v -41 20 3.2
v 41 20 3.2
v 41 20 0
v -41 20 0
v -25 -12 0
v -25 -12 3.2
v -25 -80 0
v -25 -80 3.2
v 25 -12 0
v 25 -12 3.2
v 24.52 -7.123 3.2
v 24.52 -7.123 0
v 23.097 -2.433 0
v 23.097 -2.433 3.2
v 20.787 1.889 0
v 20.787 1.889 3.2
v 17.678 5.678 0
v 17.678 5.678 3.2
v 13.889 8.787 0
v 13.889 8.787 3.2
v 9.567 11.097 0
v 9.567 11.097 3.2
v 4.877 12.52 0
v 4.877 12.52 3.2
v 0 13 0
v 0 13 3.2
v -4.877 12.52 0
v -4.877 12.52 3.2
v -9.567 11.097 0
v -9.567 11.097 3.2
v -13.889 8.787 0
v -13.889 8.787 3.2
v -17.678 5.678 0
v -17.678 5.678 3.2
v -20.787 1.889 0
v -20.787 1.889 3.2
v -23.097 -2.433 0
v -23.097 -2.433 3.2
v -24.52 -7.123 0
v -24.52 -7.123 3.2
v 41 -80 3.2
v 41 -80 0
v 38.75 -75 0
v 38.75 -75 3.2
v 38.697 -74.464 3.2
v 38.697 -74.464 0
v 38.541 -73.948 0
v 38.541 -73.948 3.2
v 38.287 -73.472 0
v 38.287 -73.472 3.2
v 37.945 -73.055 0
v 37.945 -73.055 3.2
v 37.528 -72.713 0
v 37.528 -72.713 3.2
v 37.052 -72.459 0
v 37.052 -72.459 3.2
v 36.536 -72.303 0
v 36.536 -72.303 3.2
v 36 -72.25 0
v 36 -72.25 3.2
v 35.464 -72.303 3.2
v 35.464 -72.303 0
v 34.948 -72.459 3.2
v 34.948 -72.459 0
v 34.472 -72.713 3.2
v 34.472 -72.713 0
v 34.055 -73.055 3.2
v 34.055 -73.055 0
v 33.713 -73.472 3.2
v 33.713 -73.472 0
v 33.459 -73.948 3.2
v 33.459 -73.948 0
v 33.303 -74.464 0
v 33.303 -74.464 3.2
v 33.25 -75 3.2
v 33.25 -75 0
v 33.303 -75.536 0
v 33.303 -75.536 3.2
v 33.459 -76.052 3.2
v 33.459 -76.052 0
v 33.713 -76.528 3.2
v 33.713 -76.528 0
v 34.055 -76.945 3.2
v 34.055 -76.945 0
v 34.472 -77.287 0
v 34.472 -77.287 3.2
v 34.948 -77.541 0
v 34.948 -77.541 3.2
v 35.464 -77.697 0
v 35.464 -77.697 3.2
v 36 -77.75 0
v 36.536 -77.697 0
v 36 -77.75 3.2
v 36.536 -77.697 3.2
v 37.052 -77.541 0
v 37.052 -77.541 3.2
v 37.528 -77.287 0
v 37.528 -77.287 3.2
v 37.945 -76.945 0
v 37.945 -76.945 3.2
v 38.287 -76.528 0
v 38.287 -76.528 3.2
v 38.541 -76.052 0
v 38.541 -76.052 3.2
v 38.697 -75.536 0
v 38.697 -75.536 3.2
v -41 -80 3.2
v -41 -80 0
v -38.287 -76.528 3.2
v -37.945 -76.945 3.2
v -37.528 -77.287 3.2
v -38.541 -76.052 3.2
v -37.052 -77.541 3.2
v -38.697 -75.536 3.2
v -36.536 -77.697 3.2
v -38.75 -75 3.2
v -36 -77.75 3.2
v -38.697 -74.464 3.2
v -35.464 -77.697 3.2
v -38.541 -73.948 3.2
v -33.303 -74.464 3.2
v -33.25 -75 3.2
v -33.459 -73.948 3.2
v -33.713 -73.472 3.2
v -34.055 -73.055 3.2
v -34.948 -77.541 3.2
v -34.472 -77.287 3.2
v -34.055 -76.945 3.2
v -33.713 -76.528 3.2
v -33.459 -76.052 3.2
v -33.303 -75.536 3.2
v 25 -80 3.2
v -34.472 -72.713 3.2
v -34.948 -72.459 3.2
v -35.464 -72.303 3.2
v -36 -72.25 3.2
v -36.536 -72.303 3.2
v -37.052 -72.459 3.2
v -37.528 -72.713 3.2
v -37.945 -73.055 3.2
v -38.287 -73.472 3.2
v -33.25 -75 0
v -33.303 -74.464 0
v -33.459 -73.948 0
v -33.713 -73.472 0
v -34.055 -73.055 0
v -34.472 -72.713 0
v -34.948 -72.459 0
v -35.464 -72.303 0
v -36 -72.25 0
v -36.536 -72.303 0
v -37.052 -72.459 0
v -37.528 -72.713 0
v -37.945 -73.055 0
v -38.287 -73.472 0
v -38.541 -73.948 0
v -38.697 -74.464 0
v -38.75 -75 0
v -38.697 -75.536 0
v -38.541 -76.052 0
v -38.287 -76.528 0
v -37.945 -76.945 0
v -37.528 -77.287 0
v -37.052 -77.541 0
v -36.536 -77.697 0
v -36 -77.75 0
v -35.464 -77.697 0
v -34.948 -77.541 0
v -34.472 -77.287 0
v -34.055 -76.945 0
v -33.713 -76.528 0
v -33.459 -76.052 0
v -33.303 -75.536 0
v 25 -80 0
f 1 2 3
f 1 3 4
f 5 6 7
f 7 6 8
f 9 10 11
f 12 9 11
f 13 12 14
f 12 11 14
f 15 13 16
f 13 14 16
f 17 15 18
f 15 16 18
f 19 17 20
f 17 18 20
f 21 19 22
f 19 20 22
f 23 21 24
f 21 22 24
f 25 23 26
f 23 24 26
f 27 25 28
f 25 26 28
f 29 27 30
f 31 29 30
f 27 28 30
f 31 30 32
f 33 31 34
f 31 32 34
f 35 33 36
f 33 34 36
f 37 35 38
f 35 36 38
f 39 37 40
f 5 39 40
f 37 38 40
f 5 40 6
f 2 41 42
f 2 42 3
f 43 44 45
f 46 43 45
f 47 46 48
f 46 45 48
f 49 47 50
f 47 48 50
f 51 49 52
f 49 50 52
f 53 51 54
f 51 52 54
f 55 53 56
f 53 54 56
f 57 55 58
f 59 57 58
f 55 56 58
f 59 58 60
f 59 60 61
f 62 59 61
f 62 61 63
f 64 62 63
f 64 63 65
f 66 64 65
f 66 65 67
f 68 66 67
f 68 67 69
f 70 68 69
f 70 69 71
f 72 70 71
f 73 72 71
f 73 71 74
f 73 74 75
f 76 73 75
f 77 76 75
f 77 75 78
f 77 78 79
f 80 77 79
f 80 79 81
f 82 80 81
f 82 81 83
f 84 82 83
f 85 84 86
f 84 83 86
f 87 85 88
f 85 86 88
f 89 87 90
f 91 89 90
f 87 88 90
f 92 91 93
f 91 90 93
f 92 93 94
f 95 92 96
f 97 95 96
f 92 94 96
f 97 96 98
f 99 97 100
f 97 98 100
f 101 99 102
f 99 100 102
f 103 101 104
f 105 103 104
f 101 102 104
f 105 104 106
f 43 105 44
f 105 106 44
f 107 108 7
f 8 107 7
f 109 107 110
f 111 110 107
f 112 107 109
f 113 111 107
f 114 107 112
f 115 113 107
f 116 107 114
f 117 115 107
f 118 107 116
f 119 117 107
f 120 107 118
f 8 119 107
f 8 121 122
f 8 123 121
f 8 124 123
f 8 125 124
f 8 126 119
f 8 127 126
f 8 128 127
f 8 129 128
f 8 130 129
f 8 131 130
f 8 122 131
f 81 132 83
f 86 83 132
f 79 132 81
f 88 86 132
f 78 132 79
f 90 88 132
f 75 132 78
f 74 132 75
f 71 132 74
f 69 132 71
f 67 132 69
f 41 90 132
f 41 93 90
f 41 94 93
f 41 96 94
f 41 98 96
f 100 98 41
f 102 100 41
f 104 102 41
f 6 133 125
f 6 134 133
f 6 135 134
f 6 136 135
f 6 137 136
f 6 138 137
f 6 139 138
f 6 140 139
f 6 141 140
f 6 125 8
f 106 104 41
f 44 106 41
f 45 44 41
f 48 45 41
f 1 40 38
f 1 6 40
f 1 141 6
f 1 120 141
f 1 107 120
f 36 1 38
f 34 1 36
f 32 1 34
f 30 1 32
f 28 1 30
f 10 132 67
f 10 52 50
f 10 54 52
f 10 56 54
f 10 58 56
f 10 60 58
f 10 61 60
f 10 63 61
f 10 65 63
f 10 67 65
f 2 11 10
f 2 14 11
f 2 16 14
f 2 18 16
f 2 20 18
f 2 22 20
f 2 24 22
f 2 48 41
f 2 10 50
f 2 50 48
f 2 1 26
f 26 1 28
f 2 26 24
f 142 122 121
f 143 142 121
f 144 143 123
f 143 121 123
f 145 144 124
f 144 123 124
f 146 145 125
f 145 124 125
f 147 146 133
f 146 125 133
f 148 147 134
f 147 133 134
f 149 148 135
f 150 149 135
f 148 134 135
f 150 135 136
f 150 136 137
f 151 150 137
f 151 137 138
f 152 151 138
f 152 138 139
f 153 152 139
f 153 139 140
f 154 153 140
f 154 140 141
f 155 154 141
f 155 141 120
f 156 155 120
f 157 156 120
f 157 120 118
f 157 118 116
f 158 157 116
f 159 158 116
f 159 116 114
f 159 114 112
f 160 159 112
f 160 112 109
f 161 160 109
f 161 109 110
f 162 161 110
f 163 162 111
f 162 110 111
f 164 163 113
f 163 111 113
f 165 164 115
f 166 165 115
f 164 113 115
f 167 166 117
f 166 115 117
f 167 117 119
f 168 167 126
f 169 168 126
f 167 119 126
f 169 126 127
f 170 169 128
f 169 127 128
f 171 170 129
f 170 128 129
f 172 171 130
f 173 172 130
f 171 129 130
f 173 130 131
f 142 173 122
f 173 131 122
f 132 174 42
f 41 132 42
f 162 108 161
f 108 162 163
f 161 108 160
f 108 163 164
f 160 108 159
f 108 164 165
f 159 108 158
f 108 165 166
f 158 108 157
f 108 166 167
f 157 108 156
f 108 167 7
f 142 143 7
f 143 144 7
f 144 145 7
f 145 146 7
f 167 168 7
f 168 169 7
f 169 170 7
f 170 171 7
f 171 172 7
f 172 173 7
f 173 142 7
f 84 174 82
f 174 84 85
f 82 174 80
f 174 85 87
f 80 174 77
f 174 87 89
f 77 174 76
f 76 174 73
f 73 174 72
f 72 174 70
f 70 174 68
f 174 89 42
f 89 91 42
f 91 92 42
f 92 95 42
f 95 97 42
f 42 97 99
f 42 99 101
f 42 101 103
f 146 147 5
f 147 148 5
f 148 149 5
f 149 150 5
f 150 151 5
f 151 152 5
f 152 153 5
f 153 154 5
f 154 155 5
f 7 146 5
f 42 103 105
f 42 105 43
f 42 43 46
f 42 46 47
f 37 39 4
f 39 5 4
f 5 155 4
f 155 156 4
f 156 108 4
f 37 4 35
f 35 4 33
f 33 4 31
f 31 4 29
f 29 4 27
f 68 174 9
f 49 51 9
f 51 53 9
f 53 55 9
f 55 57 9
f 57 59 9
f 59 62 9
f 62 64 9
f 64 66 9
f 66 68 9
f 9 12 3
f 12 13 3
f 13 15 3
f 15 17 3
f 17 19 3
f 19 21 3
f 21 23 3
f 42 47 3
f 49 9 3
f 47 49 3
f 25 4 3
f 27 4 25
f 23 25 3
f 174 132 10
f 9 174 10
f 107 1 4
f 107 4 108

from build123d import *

# Parameters (mm, degrees)
SKETCH1_W           = 150
SKETCH1_H           = 160
BOSS_EXTRUDE1_DEPTH = 3.2
CUT_EXTRUDE1_REACH  = 5.2
CUT_EXTRUDE2_REACH  = 5.2
SKETCH3_R           = 2.75


with BuildPart() as part:
    # Sketch1 → Boss-Extrude1 (new body)
    with BuildSketch(Plane.XY):
        Rectangle(SKETCH1_W, SKETCH1_H)
    extrude(amount=BOSS_EXTRUDE1_DEPTH)

    # Sketch2 → Cut-Extrude1 (cut, up to next)
    with BuildSketch(Plane.XY.offset(3.2), mode=Mode.PRIVATE) as cut_extrude1_sk1:
        with BuildLine():
            Line((-25, -12), (-25, -80))
            Line((-25, -80), (25, -80))
            Line((25, -80), (25, -12))
            ThreePointArc((25, -12), (0, 13), (-25, -12))
        make_face()
    cut_extrude1_tool1 = extrude(cut_extrude1_sk1.sketch, amount=-CUT_EXTRUDE1_REACH, mode=Mode.PRIVATE) & part.part
    add(cut_extrude1_tool1.solids().sort_by_distance((0, -36.004881, 3.2))[0], mode=Mode.SUBTRACT)

    # Sketch3 → Cut-Extrude2 (cut, up to next)
    with BuildSketch(Plane.XY.offset(3.2), mode=Mode.PRIVATE) as cut_extrude2_sk1:
        with Locations((36, -75)):
            Circle(SKETCH3_R)
    cut_extrude2_tool1 = extrude(cut_extrude2_sk1.sketch, amount=-CUT_EXTRUDE2_REACH, mode=Mode.PRIVATE) & part.part
    add(cut_extrude2_tool1.solids().sort_by_distance((36, -75, 3.2))[0], mode=Mode.SUBTRACT)
    # Sketch3 → Cut-Extrude2 (cut, up to next)
    with BuildSketch(Plane.XY.offset(3.2), mode=Mode.PRIVATE) as cut_extrude2_sk2:
        with Locations((-36, -75)):
            Circle(SKETCH3_R)
    cut_extrude2_tool2 = extrude(cut_extrude2_sk2.sketch, amount=-CUT_EXTRUDE2_REACH, mode=Mode.PRIVATE) & part.part
    add(cut_extrude2_tool2.solids().sort_by_distance((-36, -75, 3.2))[0], mode=Mode.SUBTRACT)
    # Sketch3 → Cut-Extrude2 (cut, up to next)
    with BuildSketch(Plane.XY.offset(3.2), mode=Mode.PRIVATE) as cut_extrude2_sk3:
        Polygon((-41, 20), (-41, -80), (-75, -80), (-75, 80), (75, 80), (75, -80), (41, -80), (41, 20), align=None)
    cut_extrude2_tool3 = extrude(cut_extrude2_sk3.sketch, amount=-CUT_EXTRUDE2_REACH, mode=Mode.PRIVATE) & part.part
    add(cut_extrude2_tool3.solids().sort_by_distance((-43.193171, -30, 3.2))[0], mode=Mode.SUBTRACT)


solid = part.part
